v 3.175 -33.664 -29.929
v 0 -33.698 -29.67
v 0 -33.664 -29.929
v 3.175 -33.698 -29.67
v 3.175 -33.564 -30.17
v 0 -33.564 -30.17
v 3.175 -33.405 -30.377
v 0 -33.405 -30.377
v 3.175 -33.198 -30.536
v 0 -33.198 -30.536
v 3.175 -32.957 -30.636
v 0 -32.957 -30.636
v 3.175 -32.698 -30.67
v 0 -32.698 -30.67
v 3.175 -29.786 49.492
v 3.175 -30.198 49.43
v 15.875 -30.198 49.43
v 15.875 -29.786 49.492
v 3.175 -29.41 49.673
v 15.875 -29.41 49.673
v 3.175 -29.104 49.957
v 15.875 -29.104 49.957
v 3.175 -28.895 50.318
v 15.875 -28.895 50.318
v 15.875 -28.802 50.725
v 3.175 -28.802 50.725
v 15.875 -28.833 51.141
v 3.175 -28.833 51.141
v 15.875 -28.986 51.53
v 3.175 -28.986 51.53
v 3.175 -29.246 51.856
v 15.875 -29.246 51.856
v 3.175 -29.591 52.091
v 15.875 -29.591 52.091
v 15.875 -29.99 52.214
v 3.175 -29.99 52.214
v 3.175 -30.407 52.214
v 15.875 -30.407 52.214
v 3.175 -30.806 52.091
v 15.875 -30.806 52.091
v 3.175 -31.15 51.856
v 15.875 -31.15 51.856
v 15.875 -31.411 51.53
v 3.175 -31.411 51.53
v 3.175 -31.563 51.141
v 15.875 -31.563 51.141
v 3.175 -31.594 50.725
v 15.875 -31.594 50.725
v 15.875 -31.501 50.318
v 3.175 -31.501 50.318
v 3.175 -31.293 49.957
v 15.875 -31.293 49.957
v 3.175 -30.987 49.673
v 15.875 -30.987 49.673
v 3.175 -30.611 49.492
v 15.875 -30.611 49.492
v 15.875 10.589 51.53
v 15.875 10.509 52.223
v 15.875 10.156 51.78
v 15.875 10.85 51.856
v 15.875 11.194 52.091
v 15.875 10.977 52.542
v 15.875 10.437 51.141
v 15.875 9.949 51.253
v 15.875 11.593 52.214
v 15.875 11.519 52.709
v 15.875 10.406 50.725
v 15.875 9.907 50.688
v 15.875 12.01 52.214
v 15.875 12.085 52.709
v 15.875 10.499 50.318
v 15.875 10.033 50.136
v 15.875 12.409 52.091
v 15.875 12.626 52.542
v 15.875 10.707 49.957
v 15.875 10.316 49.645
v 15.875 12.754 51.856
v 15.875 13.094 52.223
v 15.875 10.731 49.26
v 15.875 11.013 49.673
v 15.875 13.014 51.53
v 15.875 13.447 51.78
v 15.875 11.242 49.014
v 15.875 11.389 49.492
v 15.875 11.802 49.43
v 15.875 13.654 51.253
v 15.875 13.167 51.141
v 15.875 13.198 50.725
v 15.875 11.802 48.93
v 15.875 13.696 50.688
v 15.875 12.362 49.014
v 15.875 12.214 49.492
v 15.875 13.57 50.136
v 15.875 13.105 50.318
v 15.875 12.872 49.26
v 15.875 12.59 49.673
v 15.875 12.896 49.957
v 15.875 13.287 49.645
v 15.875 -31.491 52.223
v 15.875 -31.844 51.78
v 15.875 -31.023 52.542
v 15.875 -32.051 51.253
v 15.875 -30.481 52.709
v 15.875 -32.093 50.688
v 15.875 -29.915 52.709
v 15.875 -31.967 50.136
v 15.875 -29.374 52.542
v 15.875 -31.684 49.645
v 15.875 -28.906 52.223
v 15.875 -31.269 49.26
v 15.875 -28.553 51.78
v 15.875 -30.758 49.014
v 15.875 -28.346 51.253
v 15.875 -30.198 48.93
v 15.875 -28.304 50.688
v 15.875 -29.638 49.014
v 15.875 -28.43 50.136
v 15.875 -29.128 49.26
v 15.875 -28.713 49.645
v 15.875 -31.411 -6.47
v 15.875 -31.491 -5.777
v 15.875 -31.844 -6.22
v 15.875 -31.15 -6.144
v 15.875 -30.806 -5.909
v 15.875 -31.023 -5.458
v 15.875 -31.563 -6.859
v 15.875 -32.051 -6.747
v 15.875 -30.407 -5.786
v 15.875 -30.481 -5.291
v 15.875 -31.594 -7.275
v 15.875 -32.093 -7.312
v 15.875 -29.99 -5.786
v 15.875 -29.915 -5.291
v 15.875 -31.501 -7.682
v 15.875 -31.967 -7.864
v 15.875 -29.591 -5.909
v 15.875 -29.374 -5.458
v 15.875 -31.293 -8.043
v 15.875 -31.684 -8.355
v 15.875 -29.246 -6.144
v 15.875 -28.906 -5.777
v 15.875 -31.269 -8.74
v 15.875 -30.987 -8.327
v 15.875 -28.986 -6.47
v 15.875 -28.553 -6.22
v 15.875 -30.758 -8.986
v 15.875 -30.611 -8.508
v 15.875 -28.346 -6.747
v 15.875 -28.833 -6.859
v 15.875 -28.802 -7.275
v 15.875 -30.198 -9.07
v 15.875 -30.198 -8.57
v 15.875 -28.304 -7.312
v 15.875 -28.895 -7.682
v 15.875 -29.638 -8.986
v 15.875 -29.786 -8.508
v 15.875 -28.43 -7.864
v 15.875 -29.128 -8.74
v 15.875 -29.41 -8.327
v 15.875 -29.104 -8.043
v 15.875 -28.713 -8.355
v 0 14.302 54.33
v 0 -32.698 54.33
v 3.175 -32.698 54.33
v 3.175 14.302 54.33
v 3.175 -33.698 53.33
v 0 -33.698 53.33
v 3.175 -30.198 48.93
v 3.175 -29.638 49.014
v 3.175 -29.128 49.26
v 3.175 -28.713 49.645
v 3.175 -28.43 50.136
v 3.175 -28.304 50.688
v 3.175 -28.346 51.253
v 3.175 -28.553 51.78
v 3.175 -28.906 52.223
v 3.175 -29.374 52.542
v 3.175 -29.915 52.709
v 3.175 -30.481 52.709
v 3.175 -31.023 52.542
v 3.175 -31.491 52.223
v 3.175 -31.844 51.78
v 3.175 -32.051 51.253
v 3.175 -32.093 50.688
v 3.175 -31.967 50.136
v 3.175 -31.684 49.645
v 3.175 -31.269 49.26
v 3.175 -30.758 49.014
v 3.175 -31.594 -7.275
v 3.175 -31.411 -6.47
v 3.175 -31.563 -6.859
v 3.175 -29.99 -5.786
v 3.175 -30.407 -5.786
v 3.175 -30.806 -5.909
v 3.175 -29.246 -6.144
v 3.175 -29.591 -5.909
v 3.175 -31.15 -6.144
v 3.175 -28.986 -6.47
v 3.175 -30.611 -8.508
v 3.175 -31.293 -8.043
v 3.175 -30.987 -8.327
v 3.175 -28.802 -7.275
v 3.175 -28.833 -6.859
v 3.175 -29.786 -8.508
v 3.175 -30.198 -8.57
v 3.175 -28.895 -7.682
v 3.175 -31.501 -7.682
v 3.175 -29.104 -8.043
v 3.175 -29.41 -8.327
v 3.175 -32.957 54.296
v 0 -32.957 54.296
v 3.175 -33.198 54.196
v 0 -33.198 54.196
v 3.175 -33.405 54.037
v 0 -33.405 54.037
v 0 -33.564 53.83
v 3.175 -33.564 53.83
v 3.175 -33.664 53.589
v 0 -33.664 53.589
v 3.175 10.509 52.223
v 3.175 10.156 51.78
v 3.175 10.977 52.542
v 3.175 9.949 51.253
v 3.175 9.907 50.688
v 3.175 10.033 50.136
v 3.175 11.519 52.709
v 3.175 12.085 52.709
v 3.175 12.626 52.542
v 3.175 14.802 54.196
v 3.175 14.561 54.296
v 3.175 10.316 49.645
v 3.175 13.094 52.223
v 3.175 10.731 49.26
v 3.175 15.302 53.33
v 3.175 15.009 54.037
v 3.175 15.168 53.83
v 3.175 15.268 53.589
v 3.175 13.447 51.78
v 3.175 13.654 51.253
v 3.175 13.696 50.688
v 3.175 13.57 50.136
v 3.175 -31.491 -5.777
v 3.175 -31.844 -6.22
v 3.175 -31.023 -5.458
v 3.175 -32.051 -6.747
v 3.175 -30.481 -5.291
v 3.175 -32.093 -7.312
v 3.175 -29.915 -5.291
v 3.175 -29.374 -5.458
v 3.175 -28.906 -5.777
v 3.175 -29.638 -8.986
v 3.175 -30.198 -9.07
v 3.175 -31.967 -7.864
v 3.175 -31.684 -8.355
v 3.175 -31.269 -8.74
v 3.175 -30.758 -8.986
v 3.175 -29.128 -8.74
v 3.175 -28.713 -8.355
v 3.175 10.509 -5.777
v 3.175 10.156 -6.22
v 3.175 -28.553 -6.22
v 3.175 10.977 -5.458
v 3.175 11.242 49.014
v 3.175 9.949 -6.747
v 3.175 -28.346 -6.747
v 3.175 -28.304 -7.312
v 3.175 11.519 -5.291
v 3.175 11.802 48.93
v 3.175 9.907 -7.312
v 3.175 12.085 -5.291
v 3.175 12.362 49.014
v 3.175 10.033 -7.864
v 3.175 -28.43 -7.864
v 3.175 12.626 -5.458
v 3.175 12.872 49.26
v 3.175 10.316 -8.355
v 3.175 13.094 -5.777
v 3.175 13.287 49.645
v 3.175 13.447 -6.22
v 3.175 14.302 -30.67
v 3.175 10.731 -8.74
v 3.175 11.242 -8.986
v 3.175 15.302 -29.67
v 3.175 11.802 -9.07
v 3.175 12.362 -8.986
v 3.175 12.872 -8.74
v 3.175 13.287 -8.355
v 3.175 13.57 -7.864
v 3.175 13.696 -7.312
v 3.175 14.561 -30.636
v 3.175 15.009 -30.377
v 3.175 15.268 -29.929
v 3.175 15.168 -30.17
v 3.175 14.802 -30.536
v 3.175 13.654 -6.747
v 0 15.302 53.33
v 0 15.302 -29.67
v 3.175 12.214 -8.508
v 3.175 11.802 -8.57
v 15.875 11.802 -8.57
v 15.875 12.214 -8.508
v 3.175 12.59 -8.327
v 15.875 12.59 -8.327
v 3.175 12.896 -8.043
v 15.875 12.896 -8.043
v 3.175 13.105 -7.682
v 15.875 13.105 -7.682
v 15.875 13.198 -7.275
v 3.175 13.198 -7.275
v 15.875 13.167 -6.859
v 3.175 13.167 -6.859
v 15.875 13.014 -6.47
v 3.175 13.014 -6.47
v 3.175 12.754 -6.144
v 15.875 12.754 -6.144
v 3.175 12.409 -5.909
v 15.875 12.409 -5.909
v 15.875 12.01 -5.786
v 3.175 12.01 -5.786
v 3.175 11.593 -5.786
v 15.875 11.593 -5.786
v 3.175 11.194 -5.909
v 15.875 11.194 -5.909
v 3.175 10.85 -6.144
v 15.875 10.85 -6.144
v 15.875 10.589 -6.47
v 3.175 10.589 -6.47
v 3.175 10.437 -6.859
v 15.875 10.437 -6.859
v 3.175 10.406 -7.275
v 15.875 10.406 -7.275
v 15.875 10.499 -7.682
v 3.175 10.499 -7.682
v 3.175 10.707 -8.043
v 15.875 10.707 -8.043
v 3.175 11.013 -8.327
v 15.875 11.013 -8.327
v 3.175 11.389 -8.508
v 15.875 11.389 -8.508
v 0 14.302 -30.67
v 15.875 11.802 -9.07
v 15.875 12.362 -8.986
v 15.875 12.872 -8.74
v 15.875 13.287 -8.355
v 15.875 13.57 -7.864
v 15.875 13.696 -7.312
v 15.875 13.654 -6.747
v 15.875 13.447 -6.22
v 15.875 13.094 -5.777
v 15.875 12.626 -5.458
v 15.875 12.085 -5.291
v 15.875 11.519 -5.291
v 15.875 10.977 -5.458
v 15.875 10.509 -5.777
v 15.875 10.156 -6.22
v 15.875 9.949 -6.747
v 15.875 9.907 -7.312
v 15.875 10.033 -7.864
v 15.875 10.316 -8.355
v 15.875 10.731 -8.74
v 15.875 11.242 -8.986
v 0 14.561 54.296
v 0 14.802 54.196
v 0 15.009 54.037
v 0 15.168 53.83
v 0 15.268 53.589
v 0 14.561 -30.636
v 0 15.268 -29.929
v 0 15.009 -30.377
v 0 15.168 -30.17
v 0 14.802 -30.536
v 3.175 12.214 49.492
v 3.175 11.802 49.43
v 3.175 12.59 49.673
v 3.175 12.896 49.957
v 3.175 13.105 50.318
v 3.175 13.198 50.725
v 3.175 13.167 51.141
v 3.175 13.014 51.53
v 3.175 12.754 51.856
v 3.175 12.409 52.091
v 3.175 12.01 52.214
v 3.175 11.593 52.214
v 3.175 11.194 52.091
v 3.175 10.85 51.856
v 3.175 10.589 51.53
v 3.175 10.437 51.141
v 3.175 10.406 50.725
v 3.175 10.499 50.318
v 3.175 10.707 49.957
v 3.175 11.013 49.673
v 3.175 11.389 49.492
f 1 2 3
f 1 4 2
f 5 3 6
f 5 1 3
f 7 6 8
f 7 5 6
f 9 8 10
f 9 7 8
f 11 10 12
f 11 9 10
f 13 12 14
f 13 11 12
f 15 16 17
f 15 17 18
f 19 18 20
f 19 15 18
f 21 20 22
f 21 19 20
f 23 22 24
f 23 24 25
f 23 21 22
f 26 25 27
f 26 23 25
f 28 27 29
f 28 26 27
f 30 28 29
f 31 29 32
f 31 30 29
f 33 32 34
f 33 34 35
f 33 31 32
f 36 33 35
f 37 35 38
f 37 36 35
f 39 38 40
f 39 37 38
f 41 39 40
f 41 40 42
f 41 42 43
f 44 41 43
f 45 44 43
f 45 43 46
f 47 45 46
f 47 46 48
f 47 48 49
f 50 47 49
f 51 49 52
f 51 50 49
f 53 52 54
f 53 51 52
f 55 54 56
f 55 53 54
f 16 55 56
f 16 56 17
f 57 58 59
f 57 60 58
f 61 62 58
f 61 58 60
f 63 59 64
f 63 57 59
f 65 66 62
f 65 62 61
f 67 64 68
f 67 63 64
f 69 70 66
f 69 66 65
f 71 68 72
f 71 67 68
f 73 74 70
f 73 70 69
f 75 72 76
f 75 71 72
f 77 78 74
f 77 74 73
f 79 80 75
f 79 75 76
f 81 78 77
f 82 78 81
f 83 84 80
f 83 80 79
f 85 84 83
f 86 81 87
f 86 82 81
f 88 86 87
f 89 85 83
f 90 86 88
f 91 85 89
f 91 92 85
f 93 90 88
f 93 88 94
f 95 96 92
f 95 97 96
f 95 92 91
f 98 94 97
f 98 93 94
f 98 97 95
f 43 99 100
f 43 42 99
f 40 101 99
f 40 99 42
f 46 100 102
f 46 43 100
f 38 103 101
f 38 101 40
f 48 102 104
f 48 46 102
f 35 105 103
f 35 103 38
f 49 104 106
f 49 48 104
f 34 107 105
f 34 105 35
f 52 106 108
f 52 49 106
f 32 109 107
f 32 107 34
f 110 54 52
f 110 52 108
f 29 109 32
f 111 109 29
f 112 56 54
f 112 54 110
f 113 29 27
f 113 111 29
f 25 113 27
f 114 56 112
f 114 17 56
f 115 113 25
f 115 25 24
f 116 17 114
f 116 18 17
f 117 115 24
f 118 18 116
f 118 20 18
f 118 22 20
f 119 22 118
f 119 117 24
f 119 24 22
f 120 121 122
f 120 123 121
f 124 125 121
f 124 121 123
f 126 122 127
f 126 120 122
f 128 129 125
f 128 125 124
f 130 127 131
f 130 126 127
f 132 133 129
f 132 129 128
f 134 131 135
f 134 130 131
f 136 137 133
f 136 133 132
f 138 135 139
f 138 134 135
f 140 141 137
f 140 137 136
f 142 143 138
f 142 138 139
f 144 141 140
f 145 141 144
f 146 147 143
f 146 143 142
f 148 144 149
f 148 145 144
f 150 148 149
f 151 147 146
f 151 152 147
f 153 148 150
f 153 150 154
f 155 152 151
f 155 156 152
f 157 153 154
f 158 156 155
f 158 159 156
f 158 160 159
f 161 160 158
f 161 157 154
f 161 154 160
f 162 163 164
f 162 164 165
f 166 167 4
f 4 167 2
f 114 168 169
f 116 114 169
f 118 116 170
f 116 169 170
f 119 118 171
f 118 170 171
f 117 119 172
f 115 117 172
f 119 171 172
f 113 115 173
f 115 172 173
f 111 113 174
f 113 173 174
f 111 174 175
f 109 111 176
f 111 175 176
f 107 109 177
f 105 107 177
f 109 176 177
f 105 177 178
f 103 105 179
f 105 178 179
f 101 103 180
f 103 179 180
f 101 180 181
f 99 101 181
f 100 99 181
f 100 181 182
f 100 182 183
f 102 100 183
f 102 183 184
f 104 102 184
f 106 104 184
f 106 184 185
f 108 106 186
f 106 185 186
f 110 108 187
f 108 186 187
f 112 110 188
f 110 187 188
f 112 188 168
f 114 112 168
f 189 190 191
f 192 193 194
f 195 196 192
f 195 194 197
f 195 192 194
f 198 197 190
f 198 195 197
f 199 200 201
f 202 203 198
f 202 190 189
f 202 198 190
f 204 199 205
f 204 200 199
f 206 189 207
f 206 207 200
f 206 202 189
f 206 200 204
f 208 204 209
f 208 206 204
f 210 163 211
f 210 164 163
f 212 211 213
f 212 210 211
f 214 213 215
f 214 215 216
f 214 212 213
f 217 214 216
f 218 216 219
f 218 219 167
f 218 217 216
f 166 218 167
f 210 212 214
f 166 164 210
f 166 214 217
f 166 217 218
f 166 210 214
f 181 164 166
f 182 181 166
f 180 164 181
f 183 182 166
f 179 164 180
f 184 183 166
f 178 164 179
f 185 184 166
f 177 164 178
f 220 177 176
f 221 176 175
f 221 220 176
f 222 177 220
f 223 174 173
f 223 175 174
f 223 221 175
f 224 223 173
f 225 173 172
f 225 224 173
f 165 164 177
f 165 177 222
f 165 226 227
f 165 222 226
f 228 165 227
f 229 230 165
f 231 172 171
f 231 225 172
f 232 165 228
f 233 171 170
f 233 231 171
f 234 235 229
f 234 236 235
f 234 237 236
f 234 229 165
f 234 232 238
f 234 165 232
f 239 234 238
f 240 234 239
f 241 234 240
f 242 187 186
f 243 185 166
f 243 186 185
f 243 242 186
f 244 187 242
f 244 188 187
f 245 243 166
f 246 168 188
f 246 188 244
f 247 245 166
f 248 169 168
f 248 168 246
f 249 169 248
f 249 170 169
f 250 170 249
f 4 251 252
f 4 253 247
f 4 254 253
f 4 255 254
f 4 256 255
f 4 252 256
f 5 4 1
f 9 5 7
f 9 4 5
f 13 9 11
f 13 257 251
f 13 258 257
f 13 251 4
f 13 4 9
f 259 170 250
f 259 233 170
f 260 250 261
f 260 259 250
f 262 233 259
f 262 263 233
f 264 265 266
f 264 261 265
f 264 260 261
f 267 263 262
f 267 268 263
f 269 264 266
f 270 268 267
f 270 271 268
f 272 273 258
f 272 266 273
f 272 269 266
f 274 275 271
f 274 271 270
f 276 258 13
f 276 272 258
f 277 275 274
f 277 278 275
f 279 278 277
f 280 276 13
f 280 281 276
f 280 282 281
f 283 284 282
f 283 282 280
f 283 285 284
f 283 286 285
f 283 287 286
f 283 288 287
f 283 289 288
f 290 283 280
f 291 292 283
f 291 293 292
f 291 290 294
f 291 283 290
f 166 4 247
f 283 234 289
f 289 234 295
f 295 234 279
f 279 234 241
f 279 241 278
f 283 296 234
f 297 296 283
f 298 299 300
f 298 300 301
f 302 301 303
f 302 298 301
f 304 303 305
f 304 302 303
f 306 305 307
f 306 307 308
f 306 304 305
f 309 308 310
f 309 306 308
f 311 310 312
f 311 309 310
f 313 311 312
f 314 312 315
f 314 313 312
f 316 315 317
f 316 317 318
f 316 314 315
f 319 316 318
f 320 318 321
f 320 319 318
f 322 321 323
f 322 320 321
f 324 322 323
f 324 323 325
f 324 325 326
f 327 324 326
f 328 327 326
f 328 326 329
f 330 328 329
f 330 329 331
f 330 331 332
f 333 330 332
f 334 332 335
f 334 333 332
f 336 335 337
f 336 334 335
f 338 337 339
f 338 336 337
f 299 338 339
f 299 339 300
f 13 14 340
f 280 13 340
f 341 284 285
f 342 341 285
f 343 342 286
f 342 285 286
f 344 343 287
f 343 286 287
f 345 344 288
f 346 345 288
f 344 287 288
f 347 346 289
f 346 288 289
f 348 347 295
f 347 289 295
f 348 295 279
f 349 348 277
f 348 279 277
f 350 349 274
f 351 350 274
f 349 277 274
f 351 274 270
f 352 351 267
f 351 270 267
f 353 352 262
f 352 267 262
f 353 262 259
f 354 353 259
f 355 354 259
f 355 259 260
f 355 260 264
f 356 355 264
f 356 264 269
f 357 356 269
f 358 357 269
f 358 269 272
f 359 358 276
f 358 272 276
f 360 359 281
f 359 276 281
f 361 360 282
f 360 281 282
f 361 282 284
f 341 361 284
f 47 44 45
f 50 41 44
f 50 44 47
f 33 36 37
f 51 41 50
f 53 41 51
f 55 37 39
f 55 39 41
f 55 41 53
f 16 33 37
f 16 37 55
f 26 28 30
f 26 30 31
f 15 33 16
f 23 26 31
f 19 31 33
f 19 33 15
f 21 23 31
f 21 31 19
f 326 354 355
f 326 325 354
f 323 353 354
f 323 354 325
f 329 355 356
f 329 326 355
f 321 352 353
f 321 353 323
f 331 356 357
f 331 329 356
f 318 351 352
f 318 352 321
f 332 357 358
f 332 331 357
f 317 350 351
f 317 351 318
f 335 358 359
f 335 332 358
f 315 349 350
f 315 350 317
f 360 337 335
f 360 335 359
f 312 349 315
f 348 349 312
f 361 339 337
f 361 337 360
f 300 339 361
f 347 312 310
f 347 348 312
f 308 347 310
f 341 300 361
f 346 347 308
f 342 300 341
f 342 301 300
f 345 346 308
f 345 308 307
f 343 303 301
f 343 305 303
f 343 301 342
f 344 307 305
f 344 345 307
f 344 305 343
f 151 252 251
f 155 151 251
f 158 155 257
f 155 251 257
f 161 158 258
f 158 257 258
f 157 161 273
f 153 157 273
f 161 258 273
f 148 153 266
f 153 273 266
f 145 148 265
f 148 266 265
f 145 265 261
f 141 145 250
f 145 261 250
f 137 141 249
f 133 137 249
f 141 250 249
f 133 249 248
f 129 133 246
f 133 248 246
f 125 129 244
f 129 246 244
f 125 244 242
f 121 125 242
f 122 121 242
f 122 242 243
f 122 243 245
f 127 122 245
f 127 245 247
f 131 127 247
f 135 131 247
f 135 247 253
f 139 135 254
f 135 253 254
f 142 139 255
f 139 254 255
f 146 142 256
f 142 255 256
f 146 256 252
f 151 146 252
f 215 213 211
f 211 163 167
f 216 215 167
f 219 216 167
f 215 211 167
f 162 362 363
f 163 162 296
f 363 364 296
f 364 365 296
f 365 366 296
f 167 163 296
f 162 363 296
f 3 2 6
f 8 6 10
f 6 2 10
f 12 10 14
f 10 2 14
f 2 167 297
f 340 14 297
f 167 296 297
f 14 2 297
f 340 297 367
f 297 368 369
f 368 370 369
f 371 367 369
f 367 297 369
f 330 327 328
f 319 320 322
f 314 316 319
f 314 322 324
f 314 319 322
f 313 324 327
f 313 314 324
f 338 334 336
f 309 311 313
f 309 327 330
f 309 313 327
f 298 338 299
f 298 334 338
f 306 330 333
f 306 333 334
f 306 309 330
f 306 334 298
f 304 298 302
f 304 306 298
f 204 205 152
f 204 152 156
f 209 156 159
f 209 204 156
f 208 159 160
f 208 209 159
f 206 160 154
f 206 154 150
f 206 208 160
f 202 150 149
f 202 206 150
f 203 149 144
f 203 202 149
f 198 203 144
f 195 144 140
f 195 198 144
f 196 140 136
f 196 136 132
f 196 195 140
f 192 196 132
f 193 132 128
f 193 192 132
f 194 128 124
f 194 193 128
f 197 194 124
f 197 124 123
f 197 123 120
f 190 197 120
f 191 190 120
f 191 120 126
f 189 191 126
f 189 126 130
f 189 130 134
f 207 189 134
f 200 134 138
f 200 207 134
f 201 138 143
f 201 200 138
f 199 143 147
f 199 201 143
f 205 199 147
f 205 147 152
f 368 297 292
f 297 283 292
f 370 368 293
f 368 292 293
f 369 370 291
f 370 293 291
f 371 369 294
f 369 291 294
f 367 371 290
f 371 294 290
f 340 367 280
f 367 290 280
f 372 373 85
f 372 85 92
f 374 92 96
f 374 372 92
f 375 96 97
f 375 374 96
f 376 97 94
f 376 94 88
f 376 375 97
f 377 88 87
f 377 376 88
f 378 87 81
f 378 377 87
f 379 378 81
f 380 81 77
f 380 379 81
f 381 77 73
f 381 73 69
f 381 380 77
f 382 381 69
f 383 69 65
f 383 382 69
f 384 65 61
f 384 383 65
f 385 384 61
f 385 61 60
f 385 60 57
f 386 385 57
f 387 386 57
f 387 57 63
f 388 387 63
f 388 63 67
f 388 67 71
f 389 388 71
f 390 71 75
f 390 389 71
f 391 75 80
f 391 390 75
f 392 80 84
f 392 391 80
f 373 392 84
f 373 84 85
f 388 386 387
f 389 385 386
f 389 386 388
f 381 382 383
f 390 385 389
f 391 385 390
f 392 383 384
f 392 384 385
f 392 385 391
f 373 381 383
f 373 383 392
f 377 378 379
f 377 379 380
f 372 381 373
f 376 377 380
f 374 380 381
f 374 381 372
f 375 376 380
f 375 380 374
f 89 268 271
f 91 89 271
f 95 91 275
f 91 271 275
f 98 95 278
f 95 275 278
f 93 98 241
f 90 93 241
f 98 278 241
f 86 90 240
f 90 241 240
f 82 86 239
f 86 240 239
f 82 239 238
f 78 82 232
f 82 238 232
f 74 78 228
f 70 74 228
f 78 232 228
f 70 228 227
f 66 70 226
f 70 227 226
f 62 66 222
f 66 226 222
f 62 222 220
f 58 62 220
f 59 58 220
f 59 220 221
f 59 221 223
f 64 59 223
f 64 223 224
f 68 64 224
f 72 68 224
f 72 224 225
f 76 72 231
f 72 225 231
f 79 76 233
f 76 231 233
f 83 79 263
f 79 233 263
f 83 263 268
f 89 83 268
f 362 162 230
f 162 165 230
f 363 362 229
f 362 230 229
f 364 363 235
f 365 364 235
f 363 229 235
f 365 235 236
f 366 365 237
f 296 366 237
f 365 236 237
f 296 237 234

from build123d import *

# Parameters (mm, degrees)
SKETCH1_W           = 85
SKETCH1_H           = 49
BOSS_EXTRUDE1_DEPTH = 3.175
SKETCH2_R           = 1.9
SKETCH2_R_2         = 1.4
BOSS_EXTRUDE2_DEPTH = 12.7
FILLET1_R           = 1


with BuildPart() as part:
    # Sketch1 → Boss-Extrude1 (new body)
    with BuildSketch(Plane(origin=(0, 0, 0), x_dir=(0, 0, -1), z_dir=(1, 0, 0))):
        with Locations((-11.829824561, -9.198245614)):
            Rectangle(SKETCH1_W, SKETCH1_H)
    extrude(amount=BOSS_EXTRUDE1_DEPTH)

    # Sketch2 → Boss-Extrude2 (add)
    with BuildSketch(Plane(origin=(3.175, 0, 0), x_dir=(0, 0, -1), z_dir=(1, 0, 0))):
        with Locations((-50.829824561, 11.801754386)):
            Circle(SKETCH2_R)
        with Locations((-50.829824561, 11.801754386)):
            Circle(SKETCH2_R_2, mode=Mode.SUBTRACT)
        with Locations((7.170175439, 11.801754386)):
            Circle(SKETCH2_R)
        with Locations((7.170175439, 11.801754386)):
            Circle(SKETCH2_R_2, mode=Mode.SUBTRACT)
        with Locations((7.170175439, -30.198245614)):
            Circle(SKETCH2_R)
        with Locations((7.170175439, -30.198245614)):
            Circle(SKETCH2_R_2, mode=Mode.SUBTRACT)
        with Locations((-50.829824561, -30.198245614)):
            Circle(SKETCH2_R)
        with Locations((-50.829824561, -30.198245614)):
            Circle(SKETCH2_R_2, mode=Mode.SUBTRACT)
    extrude(amount=BOSS_EXTRUDE2_DEPTH)

    # Fillet1
    fillet1_edges = [part.edges().sort_by_distance(p)[0] for p in [
        (1.5875, 15.301754386, 54.329824561),
        (1.5875, 15.301754386, -30.670175439),
        (1.5875, -33.698245614, -30.670175439),
        (1.5875, -33.698245614, 54.329824561),
    ]]
    fillet(fillet1_edges, radius=FILLET1_R)


solid = part.part
